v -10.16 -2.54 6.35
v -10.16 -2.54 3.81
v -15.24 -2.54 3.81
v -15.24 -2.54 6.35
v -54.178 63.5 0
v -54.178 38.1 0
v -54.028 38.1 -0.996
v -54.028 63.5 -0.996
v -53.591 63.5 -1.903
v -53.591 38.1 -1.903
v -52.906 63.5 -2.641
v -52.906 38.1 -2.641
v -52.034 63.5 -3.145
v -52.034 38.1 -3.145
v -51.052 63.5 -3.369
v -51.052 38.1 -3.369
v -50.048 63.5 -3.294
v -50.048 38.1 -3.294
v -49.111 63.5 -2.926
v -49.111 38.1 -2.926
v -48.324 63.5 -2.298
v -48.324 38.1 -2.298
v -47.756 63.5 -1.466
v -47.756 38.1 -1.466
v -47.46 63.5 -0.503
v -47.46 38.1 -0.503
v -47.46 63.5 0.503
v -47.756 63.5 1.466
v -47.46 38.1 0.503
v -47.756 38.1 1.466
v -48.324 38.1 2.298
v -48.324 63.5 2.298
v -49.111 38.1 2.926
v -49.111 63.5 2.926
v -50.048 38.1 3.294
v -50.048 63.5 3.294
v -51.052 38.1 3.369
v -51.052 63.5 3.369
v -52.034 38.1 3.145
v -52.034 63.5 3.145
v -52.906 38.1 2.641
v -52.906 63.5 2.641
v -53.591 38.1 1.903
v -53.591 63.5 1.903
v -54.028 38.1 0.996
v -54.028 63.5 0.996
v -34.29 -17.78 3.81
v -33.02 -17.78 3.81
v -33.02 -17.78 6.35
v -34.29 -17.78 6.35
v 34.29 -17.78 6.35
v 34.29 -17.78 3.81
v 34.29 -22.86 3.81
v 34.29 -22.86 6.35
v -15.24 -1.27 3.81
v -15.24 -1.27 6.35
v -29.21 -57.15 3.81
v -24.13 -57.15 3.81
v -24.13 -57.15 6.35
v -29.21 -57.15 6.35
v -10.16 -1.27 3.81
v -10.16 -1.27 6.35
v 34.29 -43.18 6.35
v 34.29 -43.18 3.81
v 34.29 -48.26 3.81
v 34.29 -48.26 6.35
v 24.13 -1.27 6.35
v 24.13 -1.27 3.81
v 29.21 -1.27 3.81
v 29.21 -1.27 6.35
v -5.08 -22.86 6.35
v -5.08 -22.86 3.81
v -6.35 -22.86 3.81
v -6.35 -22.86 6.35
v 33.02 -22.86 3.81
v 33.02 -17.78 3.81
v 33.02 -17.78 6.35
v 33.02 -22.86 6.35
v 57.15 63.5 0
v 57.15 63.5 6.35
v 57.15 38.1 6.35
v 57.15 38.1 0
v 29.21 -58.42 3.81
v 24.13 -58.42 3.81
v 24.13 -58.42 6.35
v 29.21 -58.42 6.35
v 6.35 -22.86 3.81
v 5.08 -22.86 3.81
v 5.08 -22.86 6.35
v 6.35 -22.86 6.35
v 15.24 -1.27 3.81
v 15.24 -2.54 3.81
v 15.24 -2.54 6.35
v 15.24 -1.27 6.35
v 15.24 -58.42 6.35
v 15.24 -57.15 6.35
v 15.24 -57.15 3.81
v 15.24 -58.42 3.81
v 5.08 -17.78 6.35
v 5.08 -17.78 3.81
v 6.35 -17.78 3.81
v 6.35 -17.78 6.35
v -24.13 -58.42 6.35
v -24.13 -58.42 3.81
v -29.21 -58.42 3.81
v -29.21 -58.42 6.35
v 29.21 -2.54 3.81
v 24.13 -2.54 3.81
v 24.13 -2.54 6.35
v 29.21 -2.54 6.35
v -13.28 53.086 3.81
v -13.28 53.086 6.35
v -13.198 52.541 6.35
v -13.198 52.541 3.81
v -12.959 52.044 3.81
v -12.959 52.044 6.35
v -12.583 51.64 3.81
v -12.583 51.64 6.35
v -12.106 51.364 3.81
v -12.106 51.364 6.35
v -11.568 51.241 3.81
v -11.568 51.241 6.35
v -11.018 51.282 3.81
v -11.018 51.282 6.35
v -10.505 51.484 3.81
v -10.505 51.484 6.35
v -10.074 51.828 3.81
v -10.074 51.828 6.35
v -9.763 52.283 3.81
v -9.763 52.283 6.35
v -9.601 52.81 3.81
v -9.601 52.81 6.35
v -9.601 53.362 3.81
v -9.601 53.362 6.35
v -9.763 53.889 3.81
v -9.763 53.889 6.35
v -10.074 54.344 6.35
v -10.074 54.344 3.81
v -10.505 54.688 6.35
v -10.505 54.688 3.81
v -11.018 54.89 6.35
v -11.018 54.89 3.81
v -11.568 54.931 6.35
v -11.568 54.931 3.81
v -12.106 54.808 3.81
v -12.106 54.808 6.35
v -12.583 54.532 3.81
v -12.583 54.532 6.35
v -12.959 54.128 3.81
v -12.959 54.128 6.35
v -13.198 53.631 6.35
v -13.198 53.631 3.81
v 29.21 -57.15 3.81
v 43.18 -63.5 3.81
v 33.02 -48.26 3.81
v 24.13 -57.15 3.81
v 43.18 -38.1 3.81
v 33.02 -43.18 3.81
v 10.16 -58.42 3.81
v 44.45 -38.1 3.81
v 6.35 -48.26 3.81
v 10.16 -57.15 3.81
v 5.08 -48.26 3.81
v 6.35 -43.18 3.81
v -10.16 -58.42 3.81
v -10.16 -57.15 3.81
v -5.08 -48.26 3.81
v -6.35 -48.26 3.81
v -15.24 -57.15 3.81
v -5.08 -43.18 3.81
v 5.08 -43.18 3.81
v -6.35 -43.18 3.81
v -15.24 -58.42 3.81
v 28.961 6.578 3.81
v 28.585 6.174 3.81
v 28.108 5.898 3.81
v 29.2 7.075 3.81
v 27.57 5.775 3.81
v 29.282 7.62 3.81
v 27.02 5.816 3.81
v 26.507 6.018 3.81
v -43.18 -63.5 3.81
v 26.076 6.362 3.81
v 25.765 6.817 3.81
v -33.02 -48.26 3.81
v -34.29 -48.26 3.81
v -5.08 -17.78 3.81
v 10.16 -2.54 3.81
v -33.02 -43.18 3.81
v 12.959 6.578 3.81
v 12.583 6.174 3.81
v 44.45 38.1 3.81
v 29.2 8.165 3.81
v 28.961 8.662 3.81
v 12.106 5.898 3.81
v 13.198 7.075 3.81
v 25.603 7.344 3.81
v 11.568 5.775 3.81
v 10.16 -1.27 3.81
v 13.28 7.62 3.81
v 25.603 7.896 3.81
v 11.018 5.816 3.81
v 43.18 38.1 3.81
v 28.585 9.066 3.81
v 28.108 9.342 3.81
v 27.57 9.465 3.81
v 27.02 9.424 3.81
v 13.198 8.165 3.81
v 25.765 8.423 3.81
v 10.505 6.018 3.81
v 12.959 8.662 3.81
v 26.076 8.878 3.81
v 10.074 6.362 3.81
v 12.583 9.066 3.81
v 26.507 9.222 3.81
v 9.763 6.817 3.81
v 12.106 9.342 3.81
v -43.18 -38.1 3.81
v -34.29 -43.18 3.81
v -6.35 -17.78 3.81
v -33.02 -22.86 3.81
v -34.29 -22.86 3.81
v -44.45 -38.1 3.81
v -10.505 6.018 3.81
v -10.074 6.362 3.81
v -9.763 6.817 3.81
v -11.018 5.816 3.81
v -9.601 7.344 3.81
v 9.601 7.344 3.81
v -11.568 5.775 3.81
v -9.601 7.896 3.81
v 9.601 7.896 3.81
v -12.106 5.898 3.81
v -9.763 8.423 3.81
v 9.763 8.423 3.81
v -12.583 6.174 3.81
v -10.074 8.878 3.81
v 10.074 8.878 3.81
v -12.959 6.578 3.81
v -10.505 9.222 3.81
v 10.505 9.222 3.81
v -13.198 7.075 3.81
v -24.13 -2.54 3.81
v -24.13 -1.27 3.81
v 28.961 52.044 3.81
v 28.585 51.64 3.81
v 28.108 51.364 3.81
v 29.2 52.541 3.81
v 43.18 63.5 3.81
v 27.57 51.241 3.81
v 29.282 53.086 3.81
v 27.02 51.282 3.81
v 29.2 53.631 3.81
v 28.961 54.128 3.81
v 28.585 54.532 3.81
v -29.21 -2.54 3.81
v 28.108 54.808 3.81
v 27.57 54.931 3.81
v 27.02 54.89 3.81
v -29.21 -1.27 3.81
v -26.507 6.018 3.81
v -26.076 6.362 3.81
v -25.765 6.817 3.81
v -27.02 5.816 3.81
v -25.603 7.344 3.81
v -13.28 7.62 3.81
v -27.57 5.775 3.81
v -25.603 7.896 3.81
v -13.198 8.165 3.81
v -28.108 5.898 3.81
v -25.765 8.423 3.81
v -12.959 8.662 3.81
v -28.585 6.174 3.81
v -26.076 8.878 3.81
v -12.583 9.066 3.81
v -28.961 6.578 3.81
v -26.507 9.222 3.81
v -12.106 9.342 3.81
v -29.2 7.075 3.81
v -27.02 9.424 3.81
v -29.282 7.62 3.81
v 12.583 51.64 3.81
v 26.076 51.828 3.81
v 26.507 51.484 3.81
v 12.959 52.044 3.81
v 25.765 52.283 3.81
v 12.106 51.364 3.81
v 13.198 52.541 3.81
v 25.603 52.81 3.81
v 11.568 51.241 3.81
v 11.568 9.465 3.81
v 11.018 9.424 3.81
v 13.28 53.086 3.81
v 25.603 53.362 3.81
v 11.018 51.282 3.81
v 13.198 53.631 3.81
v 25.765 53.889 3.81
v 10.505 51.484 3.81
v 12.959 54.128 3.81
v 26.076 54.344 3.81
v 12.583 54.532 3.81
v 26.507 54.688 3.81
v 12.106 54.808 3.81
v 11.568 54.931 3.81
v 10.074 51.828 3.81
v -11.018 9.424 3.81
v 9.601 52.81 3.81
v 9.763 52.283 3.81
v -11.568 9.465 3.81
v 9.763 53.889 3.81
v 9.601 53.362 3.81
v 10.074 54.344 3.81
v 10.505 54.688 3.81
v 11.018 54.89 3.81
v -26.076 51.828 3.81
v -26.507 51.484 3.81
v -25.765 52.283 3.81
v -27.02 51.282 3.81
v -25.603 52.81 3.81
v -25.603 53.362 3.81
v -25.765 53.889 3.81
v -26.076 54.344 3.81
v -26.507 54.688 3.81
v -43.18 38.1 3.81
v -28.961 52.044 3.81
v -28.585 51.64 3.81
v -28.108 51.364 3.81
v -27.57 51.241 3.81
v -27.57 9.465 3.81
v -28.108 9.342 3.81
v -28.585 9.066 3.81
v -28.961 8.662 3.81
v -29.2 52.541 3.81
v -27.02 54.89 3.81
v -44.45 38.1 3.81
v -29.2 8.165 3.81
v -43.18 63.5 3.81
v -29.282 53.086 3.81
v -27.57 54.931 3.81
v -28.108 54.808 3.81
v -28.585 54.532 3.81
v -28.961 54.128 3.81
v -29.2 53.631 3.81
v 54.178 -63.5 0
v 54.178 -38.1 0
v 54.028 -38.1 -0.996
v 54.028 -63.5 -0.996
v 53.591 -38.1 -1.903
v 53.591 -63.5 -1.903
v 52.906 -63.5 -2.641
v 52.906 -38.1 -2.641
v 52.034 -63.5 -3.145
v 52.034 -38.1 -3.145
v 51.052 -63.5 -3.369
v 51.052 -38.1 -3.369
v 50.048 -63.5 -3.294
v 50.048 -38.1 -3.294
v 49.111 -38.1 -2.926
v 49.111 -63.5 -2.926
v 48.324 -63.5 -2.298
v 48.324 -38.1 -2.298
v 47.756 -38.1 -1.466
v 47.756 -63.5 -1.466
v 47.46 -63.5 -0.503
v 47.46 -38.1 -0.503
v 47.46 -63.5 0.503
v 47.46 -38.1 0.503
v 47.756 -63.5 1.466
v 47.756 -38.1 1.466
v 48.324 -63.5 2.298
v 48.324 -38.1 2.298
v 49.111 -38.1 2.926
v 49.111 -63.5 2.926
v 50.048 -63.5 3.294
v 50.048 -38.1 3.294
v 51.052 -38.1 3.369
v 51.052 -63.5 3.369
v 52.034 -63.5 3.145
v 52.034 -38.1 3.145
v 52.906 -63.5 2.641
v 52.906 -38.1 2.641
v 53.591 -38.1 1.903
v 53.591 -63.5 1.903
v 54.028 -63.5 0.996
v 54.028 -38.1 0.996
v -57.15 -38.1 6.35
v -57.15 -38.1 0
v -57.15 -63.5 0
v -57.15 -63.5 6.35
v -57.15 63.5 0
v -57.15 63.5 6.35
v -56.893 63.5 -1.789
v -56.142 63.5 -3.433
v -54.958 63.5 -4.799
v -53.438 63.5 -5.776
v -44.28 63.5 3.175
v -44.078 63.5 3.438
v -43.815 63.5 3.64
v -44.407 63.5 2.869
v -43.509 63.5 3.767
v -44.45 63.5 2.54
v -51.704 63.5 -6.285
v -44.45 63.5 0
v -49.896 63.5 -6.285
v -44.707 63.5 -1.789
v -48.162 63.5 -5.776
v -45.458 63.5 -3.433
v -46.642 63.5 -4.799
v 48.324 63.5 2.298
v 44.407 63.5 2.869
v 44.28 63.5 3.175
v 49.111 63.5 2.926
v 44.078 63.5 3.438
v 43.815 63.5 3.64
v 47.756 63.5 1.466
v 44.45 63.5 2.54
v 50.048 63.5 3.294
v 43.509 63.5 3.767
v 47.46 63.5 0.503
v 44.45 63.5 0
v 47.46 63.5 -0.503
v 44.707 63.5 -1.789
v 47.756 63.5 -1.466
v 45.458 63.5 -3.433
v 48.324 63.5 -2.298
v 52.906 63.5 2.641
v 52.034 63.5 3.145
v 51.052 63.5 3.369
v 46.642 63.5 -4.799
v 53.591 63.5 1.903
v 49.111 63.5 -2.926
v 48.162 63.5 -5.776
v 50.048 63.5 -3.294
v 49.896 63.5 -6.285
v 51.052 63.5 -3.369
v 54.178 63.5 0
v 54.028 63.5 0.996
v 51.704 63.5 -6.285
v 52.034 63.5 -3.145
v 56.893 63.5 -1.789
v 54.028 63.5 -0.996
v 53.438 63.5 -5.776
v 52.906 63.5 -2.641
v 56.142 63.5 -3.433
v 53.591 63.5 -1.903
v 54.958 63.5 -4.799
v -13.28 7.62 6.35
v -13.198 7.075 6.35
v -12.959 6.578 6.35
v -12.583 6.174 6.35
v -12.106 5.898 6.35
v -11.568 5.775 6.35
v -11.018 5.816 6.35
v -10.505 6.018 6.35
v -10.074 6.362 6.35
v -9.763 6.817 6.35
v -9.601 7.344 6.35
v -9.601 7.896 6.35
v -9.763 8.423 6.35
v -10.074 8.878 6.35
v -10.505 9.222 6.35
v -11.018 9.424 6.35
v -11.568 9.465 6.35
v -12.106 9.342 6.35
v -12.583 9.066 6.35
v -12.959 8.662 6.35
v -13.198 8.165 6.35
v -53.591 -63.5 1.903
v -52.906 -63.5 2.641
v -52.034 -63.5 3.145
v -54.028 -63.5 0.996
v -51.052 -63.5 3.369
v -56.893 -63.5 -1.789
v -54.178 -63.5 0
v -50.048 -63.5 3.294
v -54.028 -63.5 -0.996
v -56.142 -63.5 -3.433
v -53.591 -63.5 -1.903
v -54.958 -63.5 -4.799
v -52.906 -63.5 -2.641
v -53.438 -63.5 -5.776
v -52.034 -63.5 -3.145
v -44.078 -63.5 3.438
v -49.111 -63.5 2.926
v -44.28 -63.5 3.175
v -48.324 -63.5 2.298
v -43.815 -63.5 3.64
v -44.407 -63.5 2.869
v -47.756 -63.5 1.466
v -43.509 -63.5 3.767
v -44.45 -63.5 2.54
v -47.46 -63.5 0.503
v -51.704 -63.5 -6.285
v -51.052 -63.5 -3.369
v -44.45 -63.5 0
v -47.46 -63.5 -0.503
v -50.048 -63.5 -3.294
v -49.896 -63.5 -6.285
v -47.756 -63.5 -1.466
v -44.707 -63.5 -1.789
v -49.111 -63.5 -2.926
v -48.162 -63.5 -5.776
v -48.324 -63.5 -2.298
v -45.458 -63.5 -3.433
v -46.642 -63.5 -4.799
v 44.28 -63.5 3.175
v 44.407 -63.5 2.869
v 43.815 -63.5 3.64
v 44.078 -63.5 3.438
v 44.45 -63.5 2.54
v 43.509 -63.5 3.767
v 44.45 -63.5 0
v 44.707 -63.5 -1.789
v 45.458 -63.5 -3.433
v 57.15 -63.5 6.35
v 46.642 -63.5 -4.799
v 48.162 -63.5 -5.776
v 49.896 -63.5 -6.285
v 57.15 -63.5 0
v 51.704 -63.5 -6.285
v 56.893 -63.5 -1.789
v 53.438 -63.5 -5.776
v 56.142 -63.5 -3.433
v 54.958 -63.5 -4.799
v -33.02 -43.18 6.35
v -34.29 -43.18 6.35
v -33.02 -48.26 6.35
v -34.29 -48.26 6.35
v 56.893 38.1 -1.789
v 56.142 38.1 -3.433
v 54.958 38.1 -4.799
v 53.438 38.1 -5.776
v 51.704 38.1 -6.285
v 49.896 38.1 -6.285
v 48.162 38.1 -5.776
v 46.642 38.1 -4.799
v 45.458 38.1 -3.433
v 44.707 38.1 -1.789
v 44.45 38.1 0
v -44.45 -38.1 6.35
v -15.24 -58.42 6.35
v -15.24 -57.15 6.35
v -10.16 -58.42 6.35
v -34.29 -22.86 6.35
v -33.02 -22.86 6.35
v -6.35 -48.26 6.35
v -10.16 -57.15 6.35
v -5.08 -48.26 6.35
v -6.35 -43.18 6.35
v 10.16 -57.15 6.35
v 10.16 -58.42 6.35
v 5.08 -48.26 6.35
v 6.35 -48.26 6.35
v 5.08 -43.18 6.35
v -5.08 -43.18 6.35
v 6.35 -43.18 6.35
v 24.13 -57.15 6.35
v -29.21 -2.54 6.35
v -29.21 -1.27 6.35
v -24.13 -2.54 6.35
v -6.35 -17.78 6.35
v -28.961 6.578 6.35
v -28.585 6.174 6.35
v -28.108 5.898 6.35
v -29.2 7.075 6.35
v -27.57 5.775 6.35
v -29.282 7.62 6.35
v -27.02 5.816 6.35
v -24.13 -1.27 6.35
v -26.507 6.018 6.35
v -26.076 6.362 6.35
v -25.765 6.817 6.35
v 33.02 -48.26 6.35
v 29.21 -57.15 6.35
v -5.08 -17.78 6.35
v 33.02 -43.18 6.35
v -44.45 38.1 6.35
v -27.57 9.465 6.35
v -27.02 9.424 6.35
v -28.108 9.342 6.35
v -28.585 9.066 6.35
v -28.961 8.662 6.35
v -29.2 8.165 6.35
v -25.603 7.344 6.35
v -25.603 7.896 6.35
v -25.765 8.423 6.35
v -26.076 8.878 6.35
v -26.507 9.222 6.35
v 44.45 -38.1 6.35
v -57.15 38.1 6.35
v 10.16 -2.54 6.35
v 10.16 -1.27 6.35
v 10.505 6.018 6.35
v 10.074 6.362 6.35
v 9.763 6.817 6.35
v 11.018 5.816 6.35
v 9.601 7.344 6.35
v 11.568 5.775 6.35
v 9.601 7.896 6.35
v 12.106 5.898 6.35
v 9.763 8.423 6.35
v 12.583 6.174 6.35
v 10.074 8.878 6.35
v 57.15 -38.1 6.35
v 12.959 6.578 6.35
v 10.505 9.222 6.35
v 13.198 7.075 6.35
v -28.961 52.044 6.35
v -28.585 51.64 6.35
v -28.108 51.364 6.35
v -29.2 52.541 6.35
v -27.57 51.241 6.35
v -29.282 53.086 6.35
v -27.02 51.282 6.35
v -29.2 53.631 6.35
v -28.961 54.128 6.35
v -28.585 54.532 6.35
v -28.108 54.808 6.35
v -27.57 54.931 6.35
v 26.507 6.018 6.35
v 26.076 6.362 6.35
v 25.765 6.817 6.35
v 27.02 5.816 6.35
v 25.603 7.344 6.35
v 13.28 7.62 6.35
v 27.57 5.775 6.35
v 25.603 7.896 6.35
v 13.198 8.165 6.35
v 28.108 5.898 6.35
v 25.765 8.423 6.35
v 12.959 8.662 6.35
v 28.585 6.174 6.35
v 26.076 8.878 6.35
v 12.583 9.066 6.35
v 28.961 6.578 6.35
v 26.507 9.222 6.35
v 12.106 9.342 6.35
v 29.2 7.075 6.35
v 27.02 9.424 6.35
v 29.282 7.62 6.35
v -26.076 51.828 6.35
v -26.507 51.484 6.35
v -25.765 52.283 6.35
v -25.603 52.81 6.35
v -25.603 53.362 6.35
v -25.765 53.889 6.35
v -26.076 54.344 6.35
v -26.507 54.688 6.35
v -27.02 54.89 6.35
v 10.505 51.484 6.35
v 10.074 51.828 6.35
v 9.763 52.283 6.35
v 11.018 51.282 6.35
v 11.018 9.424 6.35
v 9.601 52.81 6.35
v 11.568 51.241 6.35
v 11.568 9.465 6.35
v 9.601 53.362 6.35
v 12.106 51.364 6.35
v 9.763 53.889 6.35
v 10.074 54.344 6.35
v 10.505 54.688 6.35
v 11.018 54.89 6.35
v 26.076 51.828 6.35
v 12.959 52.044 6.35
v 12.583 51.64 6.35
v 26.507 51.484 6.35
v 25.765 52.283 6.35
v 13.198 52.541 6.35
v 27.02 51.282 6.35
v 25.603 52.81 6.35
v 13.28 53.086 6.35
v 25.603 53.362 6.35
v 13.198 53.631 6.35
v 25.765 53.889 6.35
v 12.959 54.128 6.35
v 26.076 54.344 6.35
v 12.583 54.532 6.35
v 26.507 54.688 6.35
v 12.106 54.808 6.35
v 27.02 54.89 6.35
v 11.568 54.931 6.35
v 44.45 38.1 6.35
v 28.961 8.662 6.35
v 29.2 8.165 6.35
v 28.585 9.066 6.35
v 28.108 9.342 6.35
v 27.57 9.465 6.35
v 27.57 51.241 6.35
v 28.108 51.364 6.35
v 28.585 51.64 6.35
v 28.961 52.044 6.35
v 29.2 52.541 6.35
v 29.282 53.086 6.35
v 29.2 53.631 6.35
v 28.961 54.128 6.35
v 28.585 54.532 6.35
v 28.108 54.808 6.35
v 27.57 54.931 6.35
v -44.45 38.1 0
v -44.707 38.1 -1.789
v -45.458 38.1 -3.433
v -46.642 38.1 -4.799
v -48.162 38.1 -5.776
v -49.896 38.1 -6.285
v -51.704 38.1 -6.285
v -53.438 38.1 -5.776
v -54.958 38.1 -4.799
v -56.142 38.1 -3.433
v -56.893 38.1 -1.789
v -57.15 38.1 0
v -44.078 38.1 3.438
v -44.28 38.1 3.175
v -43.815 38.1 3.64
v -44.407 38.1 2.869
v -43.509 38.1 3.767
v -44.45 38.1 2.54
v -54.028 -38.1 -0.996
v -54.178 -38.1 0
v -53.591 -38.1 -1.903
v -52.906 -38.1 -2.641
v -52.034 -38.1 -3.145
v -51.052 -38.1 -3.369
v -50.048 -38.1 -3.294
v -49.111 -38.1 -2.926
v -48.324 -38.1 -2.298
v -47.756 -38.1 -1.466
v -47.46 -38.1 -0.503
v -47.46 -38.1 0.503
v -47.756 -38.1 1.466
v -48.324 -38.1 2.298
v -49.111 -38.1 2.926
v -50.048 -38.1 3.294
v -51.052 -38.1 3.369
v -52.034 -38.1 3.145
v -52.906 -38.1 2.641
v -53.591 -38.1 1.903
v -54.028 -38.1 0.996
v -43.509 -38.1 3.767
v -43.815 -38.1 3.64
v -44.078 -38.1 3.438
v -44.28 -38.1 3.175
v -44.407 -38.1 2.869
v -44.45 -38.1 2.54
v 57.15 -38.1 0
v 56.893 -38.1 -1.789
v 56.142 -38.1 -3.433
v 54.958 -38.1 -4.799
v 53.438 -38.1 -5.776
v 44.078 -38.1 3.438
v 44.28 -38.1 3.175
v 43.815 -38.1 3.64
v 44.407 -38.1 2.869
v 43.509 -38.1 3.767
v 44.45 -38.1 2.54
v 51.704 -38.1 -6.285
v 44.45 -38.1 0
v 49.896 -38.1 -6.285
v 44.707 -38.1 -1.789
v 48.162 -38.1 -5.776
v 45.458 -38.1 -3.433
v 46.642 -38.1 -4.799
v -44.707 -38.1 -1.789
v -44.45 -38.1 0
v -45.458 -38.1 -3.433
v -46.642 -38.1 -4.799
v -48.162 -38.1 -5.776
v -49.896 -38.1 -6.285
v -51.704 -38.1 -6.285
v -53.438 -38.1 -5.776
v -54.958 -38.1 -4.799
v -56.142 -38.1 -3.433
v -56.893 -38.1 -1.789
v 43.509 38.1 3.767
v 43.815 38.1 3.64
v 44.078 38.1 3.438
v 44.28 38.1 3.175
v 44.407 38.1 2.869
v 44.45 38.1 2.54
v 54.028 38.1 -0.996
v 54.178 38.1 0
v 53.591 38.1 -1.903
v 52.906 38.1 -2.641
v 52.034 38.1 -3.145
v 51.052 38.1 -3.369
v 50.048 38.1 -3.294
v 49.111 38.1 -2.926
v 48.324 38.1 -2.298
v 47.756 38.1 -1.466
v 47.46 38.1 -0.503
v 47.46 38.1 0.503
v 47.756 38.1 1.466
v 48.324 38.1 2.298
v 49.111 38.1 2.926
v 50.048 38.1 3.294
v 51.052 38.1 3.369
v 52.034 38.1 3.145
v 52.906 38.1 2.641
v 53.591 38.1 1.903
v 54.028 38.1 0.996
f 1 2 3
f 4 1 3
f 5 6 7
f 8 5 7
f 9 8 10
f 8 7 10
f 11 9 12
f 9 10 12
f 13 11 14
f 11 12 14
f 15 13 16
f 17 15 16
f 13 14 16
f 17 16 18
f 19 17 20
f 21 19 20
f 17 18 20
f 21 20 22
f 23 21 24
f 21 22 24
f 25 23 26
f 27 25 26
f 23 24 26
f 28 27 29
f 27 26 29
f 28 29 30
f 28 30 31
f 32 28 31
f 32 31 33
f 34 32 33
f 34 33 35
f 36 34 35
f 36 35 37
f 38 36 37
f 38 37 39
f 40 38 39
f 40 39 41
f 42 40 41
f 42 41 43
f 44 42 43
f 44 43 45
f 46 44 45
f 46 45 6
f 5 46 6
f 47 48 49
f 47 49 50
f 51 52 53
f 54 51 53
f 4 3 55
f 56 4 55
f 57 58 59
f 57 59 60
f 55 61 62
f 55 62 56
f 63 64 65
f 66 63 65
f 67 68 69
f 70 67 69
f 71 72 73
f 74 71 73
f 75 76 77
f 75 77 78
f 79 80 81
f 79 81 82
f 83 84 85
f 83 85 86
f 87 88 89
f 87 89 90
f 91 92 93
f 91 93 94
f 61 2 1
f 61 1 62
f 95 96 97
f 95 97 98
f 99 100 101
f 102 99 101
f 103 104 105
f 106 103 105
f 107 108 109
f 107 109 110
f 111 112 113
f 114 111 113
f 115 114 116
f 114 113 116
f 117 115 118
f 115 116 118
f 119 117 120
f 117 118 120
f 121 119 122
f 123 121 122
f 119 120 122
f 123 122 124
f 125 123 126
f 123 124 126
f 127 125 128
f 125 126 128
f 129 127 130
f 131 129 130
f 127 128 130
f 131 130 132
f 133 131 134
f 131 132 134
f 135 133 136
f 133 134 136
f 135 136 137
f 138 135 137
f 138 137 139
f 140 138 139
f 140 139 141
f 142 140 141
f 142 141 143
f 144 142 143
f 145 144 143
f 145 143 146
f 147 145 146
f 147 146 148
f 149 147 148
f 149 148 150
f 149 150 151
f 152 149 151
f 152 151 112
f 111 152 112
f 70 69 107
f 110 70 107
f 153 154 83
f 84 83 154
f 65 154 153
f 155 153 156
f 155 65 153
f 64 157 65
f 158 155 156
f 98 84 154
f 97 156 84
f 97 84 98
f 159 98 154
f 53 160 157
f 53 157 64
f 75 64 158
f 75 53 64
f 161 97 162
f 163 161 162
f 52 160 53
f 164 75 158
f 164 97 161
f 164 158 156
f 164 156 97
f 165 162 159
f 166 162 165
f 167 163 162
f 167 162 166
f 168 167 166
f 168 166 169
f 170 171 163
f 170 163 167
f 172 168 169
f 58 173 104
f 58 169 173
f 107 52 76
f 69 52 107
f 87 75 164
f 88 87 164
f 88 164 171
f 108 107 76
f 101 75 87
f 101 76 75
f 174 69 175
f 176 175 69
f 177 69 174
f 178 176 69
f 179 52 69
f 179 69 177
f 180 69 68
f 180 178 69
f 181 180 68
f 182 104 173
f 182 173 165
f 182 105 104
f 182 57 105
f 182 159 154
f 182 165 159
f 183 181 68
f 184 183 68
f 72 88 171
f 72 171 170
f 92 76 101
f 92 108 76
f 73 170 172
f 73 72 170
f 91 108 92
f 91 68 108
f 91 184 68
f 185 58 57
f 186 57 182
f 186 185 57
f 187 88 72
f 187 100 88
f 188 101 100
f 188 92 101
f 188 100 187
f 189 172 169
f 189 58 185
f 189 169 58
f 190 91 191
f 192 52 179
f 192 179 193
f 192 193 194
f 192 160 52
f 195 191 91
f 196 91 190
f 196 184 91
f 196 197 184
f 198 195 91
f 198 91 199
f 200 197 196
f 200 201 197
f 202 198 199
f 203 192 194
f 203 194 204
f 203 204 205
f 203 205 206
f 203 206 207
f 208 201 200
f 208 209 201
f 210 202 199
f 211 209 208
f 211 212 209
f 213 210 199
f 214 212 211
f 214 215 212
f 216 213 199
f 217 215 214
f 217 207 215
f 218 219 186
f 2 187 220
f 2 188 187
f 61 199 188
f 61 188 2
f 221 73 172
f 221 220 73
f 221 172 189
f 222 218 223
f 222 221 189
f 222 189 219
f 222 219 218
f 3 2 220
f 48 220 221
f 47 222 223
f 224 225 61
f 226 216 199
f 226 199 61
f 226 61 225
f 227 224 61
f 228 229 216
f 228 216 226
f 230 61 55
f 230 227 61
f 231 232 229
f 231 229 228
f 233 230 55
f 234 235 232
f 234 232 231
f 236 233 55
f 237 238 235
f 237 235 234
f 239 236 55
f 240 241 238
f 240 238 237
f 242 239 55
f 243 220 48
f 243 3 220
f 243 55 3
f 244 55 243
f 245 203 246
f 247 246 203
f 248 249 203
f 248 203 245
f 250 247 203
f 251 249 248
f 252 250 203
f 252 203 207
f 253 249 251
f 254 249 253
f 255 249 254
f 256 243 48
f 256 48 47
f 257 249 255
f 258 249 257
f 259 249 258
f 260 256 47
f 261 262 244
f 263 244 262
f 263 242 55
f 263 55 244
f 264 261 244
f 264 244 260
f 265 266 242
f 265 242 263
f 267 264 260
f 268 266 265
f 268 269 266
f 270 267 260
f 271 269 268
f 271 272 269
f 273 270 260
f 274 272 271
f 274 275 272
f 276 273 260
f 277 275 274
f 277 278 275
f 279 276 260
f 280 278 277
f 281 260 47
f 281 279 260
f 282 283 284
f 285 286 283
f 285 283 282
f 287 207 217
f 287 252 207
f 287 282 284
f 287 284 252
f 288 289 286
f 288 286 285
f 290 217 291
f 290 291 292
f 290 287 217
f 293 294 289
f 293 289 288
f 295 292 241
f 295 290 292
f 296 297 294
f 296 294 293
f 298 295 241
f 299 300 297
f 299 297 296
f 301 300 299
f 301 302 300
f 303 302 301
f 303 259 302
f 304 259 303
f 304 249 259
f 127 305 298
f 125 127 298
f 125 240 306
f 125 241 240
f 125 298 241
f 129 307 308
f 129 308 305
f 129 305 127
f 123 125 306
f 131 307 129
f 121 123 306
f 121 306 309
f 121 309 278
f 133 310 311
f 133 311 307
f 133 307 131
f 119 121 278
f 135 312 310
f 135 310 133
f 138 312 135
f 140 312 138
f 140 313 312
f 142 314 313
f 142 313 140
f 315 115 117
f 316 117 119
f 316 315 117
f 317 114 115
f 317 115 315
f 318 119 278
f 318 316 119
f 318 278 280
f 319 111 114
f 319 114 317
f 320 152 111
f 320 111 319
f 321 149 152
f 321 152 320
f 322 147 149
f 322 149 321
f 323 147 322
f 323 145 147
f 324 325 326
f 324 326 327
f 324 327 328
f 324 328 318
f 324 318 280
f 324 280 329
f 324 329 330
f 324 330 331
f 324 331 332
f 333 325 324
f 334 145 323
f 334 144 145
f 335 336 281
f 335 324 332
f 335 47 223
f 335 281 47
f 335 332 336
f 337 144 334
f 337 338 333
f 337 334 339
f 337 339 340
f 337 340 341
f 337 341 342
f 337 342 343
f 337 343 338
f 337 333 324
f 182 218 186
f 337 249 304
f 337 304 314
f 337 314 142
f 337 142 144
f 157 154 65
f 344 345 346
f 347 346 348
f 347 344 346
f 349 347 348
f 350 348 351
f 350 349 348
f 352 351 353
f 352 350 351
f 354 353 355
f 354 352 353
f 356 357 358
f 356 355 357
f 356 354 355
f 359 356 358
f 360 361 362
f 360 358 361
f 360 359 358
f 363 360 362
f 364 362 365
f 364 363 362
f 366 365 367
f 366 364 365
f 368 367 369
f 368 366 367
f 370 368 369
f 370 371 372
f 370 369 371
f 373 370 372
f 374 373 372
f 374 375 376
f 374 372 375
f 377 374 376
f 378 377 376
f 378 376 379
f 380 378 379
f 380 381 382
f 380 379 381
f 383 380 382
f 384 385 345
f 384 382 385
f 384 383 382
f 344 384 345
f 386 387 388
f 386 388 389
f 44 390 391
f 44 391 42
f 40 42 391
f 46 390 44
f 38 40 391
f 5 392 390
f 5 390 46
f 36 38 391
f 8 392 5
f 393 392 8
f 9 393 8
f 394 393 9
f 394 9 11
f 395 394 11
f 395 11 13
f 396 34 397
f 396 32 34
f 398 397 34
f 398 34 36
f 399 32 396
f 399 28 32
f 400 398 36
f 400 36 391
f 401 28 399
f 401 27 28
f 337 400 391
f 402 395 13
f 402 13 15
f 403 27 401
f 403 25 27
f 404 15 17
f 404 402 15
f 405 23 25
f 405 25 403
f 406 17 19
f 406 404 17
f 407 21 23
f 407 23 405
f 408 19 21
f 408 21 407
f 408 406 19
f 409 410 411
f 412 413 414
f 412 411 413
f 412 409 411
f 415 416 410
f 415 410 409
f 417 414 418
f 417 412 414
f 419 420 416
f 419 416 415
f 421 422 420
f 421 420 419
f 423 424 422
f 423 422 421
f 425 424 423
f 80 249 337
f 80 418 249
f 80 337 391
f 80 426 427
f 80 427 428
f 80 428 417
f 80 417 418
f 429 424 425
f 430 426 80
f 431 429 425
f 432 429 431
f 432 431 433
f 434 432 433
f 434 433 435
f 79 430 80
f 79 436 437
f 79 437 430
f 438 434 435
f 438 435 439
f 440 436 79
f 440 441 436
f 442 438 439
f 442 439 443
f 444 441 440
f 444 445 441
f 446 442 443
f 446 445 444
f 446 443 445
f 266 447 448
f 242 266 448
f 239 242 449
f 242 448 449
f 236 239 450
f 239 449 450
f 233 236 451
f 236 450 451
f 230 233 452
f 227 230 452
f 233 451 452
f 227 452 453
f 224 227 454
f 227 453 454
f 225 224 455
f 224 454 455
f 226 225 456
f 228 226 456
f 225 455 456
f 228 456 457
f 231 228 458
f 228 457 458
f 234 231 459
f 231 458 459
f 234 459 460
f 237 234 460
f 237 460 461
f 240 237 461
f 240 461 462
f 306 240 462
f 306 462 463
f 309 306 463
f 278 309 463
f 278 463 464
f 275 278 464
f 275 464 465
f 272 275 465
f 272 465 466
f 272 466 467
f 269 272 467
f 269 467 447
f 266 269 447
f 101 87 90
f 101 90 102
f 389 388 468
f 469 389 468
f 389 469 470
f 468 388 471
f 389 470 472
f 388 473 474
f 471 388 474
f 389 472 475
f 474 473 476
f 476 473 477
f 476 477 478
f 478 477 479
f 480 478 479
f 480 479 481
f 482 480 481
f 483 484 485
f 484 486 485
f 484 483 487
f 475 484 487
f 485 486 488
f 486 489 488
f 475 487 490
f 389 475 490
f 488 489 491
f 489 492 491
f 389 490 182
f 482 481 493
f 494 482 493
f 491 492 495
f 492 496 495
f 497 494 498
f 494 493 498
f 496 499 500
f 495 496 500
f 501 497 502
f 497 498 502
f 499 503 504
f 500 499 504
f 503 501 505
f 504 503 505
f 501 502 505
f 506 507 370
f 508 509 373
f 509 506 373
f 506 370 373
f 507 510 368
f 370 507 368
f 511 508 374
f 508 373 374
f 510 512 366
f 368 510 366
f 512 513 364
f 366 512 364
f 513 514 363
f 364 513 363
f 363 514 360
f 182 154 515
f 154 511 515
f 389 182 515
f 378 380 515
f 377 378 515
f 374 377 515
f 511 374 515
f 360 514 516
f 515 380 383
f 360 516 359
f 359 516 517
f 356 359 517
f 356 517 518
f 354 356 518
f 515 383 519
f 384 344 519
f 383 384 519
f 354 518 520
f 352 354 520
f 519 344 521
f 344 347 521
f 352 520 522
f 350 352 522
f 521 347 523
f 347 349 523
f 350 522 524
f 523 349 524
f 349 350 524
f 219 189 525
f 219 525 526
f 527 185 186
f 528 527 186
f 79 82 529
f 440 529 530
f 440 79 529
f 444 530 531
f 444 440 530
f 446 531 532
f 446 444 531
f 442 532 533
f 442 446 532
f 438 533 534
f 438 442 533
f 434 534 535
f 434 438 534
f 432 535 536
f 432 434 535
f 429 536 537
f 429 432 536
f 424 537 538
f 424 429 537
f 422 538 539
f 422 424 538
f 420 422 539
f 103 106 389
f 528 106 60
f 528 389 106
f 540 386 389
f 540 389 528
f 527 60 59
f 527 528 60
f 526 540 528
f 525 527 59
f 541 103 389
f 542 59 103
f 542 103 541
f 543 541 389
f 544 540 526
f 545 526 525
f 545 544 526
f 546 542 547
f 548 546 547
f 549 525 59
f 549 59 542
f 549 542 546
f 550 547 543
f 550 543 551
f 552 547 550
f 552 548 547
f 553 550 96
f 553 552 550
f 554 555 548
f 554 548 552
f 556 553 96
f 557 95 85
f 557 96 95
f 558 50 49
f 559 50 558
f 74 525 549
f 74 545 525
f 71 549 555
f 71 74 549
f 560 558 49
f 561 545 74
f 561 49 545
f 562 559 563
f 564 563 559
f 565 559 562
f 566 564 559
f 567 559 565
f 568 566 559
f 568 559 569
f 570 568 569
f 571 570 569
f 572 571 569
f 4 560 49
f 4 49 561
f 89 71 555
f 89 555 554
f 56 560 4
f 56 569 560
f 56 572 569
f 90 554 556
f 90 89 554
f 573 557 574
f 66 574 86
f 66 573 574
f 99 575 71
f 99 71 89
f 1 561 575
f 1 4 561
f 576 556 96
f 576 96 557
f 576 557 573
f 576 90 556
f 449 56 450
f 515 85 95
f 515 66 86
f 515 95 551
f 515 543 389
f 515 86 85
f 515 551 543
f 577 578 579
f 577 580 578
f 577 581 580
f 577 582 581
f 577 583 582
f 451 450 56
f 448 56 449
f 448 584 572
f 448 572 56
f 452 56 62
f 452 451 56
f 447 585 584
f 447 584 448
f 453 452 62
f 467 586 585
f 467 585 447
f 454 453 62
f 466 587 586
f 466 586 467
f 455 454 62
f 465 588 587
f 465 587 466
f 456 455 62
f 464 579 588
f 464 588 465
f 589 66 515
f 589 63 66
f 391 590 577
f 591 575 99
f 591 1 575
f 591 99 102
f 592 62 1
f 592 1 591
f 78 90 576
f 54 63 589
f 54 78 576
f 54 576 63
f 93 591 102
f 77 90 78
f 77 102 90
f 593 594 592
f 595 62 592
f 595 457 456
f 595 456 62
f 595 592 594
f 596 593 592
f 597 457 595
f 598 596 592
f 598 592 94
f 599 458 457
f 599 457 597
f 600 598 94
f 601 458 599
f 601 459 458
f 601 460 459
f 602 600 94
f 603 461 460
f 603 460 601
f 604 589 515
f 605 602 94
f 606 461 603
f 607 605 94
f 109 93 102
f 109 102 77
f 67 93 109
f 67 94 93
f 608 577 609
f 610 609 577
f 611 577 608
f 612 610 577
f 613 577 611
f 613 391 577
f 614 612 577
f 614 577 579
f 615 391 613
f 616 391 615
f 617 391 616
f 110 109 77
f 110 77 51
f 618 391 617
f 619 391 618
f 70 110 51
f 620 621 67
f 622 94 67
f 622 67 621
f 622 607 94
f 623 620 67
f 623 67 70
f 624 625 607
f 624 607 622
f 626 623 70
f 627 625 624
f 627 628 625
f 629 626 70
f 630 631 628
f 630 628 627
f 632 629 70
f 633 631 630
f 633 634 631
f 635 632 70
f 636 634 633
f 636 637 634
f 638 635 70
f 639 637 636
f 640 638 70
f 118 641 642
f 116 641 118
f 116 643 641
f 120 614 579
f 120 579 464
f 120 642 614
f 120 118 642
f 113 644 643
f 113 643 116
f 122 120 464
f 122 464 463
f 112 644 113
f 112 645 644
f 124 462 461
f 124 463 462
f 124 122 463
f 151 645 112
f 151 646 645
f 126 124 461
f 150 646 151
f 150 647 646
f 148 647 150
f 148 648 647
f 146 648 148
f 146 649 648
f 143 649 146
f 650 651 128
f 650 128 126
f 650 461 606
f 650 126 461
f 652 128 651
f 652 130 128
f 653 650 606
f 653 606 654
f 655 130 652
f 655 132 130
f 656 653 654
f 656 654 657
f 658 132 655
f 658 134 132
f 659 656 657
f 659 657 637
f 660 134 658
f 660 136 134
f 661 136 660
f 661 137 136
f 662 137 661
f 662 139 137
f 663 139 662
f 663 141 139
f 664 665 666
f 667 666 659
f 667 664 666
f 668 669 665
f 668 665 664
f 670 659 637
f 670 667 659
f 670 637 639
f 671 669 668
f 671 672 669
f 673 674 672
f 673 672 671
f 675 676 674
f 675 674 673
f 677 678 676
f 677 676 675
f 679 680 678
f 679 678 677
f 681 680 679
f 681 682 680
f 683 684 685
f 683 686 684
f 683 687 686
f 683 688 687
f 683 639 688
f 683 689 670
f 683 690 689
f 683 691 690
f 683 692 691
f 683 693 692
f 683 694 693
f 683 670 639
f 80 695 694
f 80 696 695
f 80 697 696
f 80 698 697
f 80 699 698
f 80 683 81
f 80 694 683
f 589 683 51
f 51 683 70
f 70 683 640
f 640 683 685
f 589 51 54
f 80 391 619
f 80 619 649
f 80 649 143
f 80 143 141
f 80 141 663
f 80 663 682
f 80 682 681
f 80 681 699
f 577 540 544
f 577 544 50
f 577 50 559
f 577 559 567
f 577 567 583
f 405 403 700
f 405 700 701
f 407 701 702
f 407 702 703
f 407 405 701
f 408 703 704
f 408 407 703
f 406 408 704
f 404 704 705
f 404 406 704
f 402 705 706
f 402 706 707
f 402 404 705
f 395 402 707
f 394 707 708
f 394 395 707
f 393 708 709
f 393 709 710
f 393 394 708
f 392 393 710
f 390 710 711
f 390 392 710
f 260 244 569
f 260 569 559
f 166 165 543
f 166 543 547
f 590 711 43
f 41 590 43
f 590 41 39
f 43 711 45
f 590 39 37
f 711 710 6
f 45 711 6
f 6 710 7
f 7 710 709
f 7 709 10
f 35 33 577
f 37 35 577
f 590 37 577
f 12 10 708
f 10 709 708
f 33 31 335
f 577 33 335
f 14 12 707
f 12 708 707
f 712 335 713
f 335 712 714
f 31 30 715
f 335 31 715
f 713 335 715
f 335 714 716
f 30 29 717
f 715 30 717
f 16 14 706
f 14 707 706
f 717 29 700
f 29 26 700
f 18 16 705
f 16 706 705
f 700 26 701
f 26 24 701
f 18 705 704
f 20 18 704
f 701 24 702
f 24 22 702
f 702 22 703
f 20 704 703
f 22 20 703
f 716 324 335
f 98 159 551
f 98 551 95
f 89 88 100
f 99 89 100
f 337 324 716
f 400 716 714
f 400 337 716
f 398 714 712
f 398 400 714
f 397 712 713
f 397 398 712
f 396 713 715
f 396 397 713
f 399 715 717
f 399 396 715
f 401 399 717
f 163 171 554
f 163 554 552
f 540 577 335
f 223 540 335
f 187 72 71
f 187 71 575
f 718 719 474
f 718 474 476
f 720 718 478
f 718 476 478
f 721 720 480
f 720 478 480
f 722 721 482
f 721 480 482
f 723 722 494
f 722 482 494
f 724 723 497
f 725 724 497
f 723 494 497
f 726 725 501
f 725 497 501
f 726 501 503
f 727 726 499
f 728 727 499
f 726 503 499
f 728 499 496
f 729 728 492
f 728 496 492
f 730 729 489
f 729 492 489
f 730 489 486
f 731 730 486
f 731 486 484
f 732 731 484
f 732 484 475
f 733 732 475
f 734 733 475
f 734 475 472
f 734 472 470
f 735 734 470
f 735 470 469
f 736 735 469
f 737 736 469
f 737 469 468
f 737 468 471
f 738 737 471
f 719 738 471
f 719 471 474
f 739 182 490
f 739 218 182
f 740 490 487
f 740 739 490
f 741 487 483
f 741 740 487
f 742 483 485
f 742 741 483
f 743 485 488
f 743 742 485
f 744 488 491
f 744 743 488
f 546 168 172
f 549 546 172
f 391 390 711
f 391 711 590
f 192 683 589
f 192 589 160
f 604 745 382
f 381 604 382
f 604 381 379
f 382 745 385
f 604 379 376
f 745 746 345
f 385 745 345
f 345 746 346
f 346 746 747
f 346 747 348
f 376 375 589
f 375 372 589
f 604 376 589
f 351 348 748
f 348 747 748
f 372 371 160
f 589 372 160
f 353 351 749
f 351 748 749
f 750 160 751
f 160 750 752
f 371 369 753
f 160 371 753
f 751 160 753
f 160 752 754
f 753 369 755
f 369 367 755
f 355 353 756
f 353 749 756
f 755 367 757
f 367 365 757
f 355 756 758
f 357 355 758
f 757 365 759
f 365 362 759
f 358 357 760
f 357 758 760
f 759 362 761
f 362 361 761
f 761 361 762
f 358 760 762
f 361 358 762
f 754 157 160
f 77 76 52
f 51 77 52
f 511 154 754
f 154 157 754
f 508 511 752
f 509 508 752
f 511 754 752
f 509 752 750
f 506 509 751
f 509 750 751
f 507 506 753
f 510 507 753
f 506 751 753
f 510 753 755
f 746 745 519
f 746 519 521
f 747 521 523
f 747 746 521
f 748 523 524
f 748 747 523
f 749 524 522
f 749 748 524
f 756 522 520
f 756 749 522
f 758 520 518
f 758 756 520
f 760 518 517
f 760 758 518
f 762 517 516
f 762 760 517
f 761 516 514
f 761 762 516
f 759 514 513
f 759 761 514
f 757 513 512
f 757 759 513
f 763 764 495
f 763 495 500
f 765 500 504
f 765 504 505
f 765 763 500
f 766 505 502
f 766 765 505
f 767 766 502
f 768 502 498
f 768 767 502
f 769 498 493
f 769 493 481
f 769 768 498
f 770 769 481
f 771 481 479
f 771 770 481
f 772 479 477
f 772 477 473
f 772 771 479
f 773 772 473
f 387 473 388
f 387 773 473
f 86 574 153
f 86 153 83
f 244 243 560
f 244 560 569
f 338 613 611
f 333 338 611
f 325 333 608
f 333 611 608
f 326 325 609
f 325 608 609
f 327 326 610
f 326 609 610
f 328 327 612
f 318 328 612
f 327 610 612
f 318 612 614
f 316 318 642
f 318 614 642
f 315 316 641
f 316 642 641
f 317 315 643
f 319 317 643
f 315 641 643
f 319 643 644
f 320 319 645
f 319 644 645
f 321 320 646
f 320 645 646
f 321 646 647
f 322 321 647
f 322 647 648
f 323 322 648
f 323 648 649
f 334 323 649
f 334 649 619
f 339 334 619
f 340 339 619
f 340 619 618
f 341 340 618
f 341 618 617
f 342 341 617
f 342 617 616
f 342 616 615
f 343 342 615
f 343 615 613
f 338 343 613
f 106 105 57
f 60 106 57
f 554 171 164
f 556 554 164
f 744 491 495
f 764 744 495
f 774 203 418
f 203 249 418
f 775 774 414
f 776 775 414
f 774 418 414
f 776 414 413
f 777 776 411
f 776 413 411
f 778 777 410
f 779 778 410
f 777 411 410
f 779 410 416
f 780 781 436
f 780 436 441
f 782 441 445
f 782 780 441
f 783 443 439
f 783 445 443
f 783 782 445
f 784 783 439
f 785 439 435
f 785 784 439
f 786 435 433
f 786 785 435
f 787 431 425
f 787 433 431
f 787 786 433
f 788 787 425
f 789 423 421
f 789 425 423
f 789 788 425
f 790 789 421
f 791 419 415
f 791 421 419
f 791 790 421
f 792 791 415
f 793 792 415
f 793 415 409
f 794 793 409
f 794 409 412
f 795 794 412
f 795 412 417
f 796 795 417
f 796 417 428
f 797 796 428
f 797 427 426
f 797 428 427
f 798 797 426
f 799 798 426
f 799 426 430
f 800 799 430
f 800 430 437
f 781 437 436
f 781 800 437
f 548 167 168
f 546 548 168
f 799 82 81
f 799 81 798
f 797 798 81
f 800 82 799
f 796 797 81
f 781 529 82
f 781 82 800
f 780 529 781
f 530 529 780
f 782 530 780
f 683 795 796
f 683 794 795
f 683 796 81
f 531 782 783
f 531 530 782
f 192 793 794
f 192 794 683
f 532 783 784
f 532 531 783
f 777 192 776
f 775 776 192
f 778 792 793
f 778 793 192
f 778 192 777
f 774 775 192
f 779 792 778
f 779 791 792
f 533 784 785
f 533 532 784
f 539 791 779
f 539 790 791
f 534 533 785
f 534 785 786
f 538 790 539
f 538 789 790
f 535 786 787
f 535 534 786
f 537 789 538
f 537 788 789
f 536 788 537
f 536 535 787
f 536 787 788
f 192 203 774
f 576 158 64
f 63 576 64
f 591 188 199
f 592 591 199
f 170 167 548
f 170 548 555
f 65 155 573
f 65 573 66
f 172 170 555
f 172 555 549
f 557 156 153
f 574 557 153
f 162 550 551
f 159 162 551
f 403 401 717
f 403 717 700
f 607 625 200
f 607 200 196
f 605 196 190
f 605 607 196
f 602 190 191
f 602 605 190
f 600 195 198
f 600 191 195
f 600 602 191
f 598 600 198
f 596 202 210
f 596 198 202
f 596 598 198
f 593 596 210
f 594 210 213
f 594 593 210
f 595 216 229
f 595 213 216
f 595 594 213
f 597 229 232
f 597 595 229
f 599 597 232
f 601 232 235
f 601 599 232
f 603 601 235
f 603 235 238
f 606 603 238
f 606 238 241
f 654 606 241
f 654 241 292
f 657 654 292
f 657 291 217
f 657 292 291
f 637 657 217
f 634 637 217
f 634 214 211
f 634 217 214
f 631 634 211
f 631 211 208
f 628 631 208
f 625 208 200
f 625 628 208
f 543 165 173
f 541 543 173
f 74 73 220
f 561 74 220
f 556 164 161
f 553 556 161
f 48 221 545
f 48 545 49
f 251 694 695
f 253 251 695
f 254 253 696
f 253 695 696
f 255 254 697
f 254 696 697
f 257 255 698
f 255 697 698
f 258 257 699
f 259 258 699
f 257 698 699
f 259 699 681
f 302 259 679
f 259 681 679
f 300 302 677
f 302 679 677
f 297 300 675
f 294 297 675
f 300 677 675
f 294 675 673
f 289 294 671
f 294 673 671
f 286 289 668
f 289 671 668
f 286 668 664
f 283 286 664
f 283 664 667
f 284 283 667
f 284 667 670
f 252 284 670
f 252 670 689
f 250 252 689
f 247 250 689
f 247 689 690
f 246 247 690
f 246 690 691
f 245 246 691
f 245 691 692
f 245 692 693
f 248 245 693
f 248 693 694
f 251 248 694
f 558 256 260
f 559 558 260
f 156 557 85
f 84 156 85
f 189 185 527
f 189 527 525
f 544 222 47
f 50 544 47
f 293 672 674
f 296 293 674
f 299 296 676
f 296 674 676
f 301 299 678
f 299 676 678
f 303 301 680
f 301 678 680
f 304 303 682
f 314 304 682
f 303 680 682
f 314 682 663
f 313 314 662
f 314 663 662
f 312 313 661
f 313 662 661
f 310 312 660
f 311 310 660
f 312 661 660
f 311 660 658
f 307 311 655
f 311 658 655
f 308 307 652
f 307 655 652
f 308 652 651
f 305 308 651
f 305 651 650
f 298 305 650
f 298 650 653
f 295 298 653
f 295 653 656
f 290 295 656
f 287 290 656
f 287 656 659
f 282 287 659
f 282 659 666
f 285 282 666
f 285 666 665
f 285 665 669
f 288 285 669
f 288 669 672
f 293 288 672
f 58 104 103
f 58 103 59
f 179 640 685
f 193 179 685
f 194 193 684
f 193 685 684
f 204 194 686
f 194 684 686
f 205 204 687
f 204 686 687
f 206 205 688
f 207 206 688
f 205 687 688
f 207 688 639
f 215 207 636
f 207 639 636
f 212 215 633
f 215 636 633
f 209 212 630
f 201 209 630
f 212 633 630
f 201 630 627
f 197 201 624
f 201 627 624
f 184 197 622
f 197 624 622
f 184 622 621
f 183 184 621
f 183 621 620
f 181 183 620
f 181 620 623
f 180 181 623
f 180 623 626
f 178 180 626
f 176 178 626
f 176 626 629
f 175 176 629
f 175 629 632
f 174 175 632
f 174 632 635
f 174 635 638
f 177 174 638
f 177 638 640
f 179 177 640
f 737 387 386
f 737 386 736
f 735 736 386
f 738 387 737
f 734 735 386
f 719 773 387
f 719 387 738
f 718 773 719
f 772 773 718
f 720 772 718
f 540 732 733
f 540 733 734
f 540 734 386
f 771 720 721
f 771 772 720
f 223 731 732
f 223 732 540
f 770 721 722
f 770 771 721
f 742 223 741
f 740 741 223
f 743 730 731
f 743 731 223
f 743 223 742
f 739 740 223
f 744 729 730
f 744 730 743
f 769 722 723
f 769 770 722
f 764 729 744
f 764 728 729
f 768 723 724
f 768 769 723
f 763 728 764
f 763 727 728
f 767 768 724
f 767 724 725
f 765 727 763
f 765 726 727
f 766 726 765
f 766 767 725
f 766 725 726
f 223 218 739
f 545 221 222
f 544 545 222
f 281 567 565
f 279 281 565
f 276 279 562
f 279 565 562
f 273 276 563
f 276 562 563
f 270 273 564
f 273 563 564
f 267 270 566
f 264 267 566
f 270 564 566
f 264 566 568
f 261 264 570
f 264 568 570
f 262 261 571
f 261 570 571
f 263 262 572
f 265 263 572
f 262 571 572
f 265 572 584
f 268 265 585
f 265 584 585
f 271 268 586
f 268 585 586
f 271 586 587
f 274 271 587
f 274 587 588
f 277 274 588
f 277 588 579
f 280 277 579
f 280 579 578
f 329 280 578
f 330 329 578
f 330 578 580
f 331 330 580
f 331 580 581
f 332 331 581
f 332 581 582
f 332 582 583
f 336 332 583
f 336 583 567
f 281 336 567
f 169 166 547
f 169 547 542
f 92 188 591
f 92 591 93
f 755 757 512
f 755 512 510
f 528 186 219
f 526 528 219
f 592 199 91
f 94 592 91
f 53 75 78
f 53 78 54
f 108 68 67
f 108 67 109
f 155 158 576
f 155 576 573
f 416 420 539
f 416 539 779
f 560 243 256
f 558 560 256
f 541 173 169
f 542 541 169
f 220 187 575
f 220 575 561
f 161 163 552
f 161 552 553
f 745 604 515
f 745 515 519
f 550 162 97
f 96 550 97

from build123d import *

# Parameters (mm, degrees)
BOSS_EXTRUDE1_DEPTH     = 63.5
SKETCH3_W               = 1.27
SKETCH3_H               = 5.08
CUT_EXTRUDE2_DEPTH      = 87.032540937
LPATTERN1_COUNT         = 2
LPATTERN1_PITCH         = 25.4
LPATTERN1_COUNT_DIR2    = 2
LPATTERN1_PITCH_DIR2    = 27.94
MIRROR1_COPY_1_SKETCH_W = 1.27
MIRROR1_COPY_1_SKETCH_H = 5.08
MIRROR1_COPY_1_DEPTH    = 87.032540937
MIRROR1_COPY_2_SKETCH_W = 1.27
MIRROR1_COPY_2_SKETCH_H = 5.08
MIRROR1_COPY_2_DEPTH    = 87.032540937
MIRROR1_COPY_3_SKETCH_W = 1.27
MIRROR1_COPY_3_SKETCH_H = 5.08
MIRROR1_COPY_3_DEPTH    = 87.032540937
SKETCH5_W               = 5.08
SKETCH5_H               = 1.27
CUT_EXTRUDE3_DEPTH      = 87.032540937
LPATTERN2_COUNT         = 2
LPATTERN2_PITCH         = 13.97
LPATTERN2_COUNT_DIR2    = 2
LPATTERN2_PITCH_DIR2    = 55.88
MIRROR2_COPY_1_SKETCH_W = 5.08
MIRROR2_COPY_1_SKETCH_H = 1.27
MIRROR2_COPY_1_DEPTH    = 87.032540937
MIRROR2_COPY_2_SKETCH_W = 5.08
MIRROR2_COPY_2_SKETCH_H = 1.27
MIRROR2_COPY_2_DEPTH    = 87.032540937
MIRROR2_COPY_3_SKETCH_W = 5.08
MIRROR2_COPY_3_SKETCH_H = 1.27
MIRROR2_COPY_3_DEPTH    = 87.032540937
F_1_0MM_DOWEL_HOLE1_D   = 3.7
LPATTERN3_COUNT         = 2
LPATTERN3_PITCH         = 16.002
LPATTERN3_COUNT_DIR2    = 2
LPATTERN3_PITCH_DIR2    = 45.466
MIRROR3_COPY_1_D        = 3.7
MIRROR3_COPY_2_D        = 3.7
MIRROR3_COPY_3_D        = 3.7
F_1_4_CLEARANCE_HOLE1_D = 6.7564
CUT_EXTRUDE4_DEPTH      = 38.1
FILLET1_R               = 1.27
FILLET2_R               = 1.27


with BuildPart() as part:
    # Sketch1 → Boss-Extrude1 (new, symmetric)
    with BuildSketch(Plane(origin=(0, 0, 0), x_dir=(1, 0, 0), z_dir=(0, 1, 0))):
        with BuildLine():
            Line((0, -6.35), (57.15, -6.35))
            Line((57.15, -6.35), (57.15, 0))
            ThreePointArc((57.15, 0), (50.799999392, 6.349999392), (44.45, -1.216e-06))
            Line((44.45, -1.216e-06), (44.45, -3.81))
            Line((44.45, -3.81), (-44.45, -3.81))
            Line((-44.45, -3.81), (-44.45, 0))
            ThreePointArc((-44.45, 0), (-50.8, 6.35), (-57.15, 0))
            Line((-57.15, 0), (-57.15, -6.35))
            Line((-57.15, -6.35), (0, -6.35))
        make_face()
    extrude(amount=BOSS_EXTRUDE1_DEPTH, both=True)

    # Sketch3 → Cut-Extrude2 (cut, through all)
    with BuildSketch(Plane(origin=(0, 0, 3.81), x_dir=(-1, 0, 0), z_dir=(0, 0, -1))):
        with Locations((5.715, -20.32)):
            Rectangle(SKETCH3_W, SKETCH3_H)
    cut_extrude2 = extrude(amount=-CUT_EXTRUDE2_DEPTH, mode=Mode.SUBTRACT)

    # LPattern1: Cut-Extrude2 2 × 2
    with Locations(*[(-j * LPATTERN1_PITCH_DIR2, -i * LPATTERN1_PITCH, 0) for i in range(LPATTERN1_COUNT) for j in range(LPATTERN1_COUNT_DIR2) if (i, j) != (0, 0)]):
        add(cut_extrude2, mode=Mode.SUBTRACT)

    # Mirror1: Cut-Extrude2 across plane
    add(cut_extrude2.mirror(Plane(origin=(0, 0, 0), x_dir=(0, 0, 1), z_dir=(1, 0, 0))), mode=Mode.SUBTRACT)

    # Mirror1 copy 1 sketch → Mirror1 copy 1 (cut, through all)
    with BuildSketch(Plane(origin=(27.94, 0, 3.81), x_dir=(1, 0, 0), z_dir=(0, 0, -1))):
        with Locations((5.715, 20.32)):
            Rectangle(MIRROR1_COPY_1_SKETCH_W, MIRROR1_COPY_1_SKETCH_H)
    extrude(amount=-MIRROR1_COPY_1_DEPTH, mode=Mode.SUBTRACT)

    # Mirror1 copy 2 sketch → Mirror1 copy 2 (cut, through all)
    with BuildSketch(Plane(origin=(0, -25.4, 3.81), x_dir=(1, 0, 0), z_dir=(0, 0, -1))):
        with Locations((5.715, 20.32)):
            Rectangle(MIRROR1_COPY_2_SKETCH_W, MIRROR1_COPY_2_SKETCH_H)
    extrude(amount=-MIRROR1_COPY_2_DEPTH, mode=Mode.SUBTRACT)

    # Mirror1 copy 3 sketch → Mirror1 copy 3 (cut, through all)
    with BuildSketch(Plane(origin=(27.94, -25.4, 3.81), x_dir=(1, 0, 0), z_dir=(0, 0, -1))):
        with Locations((5.715, 20.32)):
            Rectangle(MIRROR1_COPY_3_SKETCH_W, MIRROR1_COPY_3_SKETCH_H)
    extrude(amount=-MIRROR1_COPY_3_DEPTH, mode=Mode.SUBTRACT)

    # Sketch5 → Cut-Extrude3 (cut, through all)
    with BuildSketch(Plane(origin=(0, 0, 3.81), x_dir=(-1, 0, 0), z_dir=(0, 0, -1))):
        with Locations((12.7, -1.905)):
            Rectangle(SKETCH5_W, SKETCH5_H)
    cut_extrude3 = extrude(amount=-CUT_EXTRUDE3_DEPTH, mode=Mode.SUBTRACT)

    # LPattern2: Cut-Extrude3 2 × 2
    with Locations(*[(-i * LPATTERN2_PITCH, -j * LPATTERN2_PITCH_DIR2, 0) for i in range(LPATTERN2_COUNT) for j in range(LPATTERN2_COUNT_DIR2) if (i, j) != (0, 0)]):
        add(cut_extrude3, mode=Mode.SUBTRACT)

    # Mirror2: Cut-Extrude3 across plane
    add(cut_extrude3.mirror(Plane(origin=(0, 0, 0), x_dir=(0, 0, 1), z_dir=(1, 0, 0))), mode=Mode.SUBTRACT)

    # Mirror2 copy 1 sketch → Mirror2 copy 1 (cut, through all)
    with BuildSketch(Plane(origin=(0, -55.88, 3.81), x_dir=(1, 0, 0), z_dir=(0, 0, -1))):
        with Locations((12.7, 1.905)):
            Rectangle(MIRROR2_COPY_1_SKETCH_W, MIRROR2_COPY_1_SKETCH_H)
    extrude(amount=-MIRROR2_COPY_1_DEPTH, mode=Mode.SUBTRACT)

    # Mirror2 copy 2 sketch → Mirror2 copy 2 (cut, through all)
    with BuildSketch(Plane(origin=(13.97, 0, 3.81), x_dir=(1, 0, 0), z_dir=(0, 0, -1))):
        with Locations((12.7, 1.905)):
            Rectangle(MIRROR2_COPY_2_SKETCH_W, MIRROR2_COPY_2_SKETCH_H)
    extrude(amount=-MIRROR2_COPY_2_DEPTH, mode=Mode.SUBTRACT)

    # Mirror2 copy 3 sketch → Mirror2 copy 3 (cut, through all)
    with BuildSketch(Plane(origin=(13.97, -55.88, 3.81), x_dir=(1, 0, 0), z_dir=(0, 0, -1))):
        with Locations((12.7, 1.905)):
            Rectangle(MIRROR2_COPY_3_SKETCH_W, MIRROR2_COPY_3_SKETCH_H)
    extrude(amount=-MIRROR2_COPY_3_DEPTH, mode=Mode.SUBTRACT)

    # Ø1.0mm Dowel Hole1 (through all)
    with Locations(Plane(origin=(0, 0, 0), x_dir=(1, 0, 0), z_dir=(0, 0, -1))):
        with Locations((-11.43, -7.62)):
            f_1_0mm_dowel_hole1 = Hole(F_1_0MM_DOWEL_HOLE1_D / 2)

    # LPattern3: 1.0mm Dowel Hole1 2 × 2
    with Locations(*[(-i * LPATTERN3_PITCH, j * LPATTERN3_PITCH_DIR2, 0) for i in range(LPATTERN3_COUNT) for j in range(LPATTERN3_COUNT_DIR2) if (i, j) != (0, 0)]):
        add(f_1_0mm_dowel_hole1, mode=Mode.SUBTRACT)

    # Mirror3: Ø1.0mm Dowel Hole1 across plane
    add(f_1_0mm_dowel_hole1.mirror(Plane(origin=(0, 0, 0), x_dir=(0, 0, 1), z_dir=(1, 0, 0))), mode=Mode.SUBTRACT)

    # Mirror3 copy 1 (through all)
    with Locations(Plane(origin=(0, 45.466, 0), x_dir=(-1, 0, 0), z_dir=(0, 0, -1))):
        with Locations((-11.43, 7.62)):
            Hole(MIRROR3_COPY_1_D / 2)

    # Mirror3 copy 2 (through all)
    with Locations(Plane(origin=(16.002, 0, 0), x_dir=(-1, 0, 0), z_dir=(0, 0, -1))):
        with Locations((-11.43, 7.62)):
            Hole(MIRROR3_COPY_2_D / 2)

    # Mirror3 copy 3 (through all)
    with Locations(Plane(origin=(16.002, 45.466, 0), x_dir=(-1, 0, 0), z_dir=(0, 0, -1))):
        with Locations((-11.43, 7.62)):
            Hole(MIRROR3_COPY_3_D / 2)

    # 1/4 Clearance Hole1 (through all)
    with Locations(Plane(origin=(0, 63.5, 0), x_dir=(1, 0, 0), z_dir=(0, 1, 0))):
        with Locations((-50.8, 0)):
            f_1_4_clearance_hole1 = Hole(F_1_4_CLEARANCE_HOLE1_D / 2)

    # Mirror4: 1/4 Clearance Hole1 across plane
    add(f_1_4_clearance_hole1.mirror(Plane(origin=(0, 0, 0), x_dir=(0, 0, 1), z_dir=(1, 0, 0))), mode=Mode.SUBTRACT)

    # Sketch16 → Cut-Extrude4 (cut, symmetric)
    with BuildSketch(Plane(origin=(0, 0, 0), x_dir=(1, 0, 0), z_dir=(0, 1, 0))):
        with BuildLine():
            Line((-57.15, 0), (-57.15, -6.35))
            Line((-57.15, -6.35), (-44.45, -6.35))
            Line((-44.45, -6.35), (-44.45, 0))
            ThreePointArc((-44.45, 0), (-50.8, 6.35), (-57.15, 0))
        make_face()
    cut_extrude4 = extrude(amount=CUT_EXTRUDE4_DEPTH, both=True, mode=Mode.SUBTRACT)

    # Mirror5: Cut-Extrude4 across plane
    add(cut_extrude4.mirror(Plane(origin=(0, 0, 0), x_dir=(0, 0, 1), z_dir=(1, 0, 0))), mode=Mode.SUBTRACT)

    # Fillet1
    fillet1_edges = [part.edges().sort_by_distance(p)[0] for p in [
        (-44.45, 50.8, 3.81),
        (-44.45, -50.8, 3.81),
    ]]
    fillet(fillet1_edges, radius=FILLET1_R)

    # Fillet2
    fillet2_edges = [part.edges().sort_by_distance(p)[0] for p in [
        (44.45, 50.8, 3.81),
        (44.45, -50.8, 3.81),
    ]]
    fillet(fillet2_edges, radius=FILLET2_R)


solid = part.part
